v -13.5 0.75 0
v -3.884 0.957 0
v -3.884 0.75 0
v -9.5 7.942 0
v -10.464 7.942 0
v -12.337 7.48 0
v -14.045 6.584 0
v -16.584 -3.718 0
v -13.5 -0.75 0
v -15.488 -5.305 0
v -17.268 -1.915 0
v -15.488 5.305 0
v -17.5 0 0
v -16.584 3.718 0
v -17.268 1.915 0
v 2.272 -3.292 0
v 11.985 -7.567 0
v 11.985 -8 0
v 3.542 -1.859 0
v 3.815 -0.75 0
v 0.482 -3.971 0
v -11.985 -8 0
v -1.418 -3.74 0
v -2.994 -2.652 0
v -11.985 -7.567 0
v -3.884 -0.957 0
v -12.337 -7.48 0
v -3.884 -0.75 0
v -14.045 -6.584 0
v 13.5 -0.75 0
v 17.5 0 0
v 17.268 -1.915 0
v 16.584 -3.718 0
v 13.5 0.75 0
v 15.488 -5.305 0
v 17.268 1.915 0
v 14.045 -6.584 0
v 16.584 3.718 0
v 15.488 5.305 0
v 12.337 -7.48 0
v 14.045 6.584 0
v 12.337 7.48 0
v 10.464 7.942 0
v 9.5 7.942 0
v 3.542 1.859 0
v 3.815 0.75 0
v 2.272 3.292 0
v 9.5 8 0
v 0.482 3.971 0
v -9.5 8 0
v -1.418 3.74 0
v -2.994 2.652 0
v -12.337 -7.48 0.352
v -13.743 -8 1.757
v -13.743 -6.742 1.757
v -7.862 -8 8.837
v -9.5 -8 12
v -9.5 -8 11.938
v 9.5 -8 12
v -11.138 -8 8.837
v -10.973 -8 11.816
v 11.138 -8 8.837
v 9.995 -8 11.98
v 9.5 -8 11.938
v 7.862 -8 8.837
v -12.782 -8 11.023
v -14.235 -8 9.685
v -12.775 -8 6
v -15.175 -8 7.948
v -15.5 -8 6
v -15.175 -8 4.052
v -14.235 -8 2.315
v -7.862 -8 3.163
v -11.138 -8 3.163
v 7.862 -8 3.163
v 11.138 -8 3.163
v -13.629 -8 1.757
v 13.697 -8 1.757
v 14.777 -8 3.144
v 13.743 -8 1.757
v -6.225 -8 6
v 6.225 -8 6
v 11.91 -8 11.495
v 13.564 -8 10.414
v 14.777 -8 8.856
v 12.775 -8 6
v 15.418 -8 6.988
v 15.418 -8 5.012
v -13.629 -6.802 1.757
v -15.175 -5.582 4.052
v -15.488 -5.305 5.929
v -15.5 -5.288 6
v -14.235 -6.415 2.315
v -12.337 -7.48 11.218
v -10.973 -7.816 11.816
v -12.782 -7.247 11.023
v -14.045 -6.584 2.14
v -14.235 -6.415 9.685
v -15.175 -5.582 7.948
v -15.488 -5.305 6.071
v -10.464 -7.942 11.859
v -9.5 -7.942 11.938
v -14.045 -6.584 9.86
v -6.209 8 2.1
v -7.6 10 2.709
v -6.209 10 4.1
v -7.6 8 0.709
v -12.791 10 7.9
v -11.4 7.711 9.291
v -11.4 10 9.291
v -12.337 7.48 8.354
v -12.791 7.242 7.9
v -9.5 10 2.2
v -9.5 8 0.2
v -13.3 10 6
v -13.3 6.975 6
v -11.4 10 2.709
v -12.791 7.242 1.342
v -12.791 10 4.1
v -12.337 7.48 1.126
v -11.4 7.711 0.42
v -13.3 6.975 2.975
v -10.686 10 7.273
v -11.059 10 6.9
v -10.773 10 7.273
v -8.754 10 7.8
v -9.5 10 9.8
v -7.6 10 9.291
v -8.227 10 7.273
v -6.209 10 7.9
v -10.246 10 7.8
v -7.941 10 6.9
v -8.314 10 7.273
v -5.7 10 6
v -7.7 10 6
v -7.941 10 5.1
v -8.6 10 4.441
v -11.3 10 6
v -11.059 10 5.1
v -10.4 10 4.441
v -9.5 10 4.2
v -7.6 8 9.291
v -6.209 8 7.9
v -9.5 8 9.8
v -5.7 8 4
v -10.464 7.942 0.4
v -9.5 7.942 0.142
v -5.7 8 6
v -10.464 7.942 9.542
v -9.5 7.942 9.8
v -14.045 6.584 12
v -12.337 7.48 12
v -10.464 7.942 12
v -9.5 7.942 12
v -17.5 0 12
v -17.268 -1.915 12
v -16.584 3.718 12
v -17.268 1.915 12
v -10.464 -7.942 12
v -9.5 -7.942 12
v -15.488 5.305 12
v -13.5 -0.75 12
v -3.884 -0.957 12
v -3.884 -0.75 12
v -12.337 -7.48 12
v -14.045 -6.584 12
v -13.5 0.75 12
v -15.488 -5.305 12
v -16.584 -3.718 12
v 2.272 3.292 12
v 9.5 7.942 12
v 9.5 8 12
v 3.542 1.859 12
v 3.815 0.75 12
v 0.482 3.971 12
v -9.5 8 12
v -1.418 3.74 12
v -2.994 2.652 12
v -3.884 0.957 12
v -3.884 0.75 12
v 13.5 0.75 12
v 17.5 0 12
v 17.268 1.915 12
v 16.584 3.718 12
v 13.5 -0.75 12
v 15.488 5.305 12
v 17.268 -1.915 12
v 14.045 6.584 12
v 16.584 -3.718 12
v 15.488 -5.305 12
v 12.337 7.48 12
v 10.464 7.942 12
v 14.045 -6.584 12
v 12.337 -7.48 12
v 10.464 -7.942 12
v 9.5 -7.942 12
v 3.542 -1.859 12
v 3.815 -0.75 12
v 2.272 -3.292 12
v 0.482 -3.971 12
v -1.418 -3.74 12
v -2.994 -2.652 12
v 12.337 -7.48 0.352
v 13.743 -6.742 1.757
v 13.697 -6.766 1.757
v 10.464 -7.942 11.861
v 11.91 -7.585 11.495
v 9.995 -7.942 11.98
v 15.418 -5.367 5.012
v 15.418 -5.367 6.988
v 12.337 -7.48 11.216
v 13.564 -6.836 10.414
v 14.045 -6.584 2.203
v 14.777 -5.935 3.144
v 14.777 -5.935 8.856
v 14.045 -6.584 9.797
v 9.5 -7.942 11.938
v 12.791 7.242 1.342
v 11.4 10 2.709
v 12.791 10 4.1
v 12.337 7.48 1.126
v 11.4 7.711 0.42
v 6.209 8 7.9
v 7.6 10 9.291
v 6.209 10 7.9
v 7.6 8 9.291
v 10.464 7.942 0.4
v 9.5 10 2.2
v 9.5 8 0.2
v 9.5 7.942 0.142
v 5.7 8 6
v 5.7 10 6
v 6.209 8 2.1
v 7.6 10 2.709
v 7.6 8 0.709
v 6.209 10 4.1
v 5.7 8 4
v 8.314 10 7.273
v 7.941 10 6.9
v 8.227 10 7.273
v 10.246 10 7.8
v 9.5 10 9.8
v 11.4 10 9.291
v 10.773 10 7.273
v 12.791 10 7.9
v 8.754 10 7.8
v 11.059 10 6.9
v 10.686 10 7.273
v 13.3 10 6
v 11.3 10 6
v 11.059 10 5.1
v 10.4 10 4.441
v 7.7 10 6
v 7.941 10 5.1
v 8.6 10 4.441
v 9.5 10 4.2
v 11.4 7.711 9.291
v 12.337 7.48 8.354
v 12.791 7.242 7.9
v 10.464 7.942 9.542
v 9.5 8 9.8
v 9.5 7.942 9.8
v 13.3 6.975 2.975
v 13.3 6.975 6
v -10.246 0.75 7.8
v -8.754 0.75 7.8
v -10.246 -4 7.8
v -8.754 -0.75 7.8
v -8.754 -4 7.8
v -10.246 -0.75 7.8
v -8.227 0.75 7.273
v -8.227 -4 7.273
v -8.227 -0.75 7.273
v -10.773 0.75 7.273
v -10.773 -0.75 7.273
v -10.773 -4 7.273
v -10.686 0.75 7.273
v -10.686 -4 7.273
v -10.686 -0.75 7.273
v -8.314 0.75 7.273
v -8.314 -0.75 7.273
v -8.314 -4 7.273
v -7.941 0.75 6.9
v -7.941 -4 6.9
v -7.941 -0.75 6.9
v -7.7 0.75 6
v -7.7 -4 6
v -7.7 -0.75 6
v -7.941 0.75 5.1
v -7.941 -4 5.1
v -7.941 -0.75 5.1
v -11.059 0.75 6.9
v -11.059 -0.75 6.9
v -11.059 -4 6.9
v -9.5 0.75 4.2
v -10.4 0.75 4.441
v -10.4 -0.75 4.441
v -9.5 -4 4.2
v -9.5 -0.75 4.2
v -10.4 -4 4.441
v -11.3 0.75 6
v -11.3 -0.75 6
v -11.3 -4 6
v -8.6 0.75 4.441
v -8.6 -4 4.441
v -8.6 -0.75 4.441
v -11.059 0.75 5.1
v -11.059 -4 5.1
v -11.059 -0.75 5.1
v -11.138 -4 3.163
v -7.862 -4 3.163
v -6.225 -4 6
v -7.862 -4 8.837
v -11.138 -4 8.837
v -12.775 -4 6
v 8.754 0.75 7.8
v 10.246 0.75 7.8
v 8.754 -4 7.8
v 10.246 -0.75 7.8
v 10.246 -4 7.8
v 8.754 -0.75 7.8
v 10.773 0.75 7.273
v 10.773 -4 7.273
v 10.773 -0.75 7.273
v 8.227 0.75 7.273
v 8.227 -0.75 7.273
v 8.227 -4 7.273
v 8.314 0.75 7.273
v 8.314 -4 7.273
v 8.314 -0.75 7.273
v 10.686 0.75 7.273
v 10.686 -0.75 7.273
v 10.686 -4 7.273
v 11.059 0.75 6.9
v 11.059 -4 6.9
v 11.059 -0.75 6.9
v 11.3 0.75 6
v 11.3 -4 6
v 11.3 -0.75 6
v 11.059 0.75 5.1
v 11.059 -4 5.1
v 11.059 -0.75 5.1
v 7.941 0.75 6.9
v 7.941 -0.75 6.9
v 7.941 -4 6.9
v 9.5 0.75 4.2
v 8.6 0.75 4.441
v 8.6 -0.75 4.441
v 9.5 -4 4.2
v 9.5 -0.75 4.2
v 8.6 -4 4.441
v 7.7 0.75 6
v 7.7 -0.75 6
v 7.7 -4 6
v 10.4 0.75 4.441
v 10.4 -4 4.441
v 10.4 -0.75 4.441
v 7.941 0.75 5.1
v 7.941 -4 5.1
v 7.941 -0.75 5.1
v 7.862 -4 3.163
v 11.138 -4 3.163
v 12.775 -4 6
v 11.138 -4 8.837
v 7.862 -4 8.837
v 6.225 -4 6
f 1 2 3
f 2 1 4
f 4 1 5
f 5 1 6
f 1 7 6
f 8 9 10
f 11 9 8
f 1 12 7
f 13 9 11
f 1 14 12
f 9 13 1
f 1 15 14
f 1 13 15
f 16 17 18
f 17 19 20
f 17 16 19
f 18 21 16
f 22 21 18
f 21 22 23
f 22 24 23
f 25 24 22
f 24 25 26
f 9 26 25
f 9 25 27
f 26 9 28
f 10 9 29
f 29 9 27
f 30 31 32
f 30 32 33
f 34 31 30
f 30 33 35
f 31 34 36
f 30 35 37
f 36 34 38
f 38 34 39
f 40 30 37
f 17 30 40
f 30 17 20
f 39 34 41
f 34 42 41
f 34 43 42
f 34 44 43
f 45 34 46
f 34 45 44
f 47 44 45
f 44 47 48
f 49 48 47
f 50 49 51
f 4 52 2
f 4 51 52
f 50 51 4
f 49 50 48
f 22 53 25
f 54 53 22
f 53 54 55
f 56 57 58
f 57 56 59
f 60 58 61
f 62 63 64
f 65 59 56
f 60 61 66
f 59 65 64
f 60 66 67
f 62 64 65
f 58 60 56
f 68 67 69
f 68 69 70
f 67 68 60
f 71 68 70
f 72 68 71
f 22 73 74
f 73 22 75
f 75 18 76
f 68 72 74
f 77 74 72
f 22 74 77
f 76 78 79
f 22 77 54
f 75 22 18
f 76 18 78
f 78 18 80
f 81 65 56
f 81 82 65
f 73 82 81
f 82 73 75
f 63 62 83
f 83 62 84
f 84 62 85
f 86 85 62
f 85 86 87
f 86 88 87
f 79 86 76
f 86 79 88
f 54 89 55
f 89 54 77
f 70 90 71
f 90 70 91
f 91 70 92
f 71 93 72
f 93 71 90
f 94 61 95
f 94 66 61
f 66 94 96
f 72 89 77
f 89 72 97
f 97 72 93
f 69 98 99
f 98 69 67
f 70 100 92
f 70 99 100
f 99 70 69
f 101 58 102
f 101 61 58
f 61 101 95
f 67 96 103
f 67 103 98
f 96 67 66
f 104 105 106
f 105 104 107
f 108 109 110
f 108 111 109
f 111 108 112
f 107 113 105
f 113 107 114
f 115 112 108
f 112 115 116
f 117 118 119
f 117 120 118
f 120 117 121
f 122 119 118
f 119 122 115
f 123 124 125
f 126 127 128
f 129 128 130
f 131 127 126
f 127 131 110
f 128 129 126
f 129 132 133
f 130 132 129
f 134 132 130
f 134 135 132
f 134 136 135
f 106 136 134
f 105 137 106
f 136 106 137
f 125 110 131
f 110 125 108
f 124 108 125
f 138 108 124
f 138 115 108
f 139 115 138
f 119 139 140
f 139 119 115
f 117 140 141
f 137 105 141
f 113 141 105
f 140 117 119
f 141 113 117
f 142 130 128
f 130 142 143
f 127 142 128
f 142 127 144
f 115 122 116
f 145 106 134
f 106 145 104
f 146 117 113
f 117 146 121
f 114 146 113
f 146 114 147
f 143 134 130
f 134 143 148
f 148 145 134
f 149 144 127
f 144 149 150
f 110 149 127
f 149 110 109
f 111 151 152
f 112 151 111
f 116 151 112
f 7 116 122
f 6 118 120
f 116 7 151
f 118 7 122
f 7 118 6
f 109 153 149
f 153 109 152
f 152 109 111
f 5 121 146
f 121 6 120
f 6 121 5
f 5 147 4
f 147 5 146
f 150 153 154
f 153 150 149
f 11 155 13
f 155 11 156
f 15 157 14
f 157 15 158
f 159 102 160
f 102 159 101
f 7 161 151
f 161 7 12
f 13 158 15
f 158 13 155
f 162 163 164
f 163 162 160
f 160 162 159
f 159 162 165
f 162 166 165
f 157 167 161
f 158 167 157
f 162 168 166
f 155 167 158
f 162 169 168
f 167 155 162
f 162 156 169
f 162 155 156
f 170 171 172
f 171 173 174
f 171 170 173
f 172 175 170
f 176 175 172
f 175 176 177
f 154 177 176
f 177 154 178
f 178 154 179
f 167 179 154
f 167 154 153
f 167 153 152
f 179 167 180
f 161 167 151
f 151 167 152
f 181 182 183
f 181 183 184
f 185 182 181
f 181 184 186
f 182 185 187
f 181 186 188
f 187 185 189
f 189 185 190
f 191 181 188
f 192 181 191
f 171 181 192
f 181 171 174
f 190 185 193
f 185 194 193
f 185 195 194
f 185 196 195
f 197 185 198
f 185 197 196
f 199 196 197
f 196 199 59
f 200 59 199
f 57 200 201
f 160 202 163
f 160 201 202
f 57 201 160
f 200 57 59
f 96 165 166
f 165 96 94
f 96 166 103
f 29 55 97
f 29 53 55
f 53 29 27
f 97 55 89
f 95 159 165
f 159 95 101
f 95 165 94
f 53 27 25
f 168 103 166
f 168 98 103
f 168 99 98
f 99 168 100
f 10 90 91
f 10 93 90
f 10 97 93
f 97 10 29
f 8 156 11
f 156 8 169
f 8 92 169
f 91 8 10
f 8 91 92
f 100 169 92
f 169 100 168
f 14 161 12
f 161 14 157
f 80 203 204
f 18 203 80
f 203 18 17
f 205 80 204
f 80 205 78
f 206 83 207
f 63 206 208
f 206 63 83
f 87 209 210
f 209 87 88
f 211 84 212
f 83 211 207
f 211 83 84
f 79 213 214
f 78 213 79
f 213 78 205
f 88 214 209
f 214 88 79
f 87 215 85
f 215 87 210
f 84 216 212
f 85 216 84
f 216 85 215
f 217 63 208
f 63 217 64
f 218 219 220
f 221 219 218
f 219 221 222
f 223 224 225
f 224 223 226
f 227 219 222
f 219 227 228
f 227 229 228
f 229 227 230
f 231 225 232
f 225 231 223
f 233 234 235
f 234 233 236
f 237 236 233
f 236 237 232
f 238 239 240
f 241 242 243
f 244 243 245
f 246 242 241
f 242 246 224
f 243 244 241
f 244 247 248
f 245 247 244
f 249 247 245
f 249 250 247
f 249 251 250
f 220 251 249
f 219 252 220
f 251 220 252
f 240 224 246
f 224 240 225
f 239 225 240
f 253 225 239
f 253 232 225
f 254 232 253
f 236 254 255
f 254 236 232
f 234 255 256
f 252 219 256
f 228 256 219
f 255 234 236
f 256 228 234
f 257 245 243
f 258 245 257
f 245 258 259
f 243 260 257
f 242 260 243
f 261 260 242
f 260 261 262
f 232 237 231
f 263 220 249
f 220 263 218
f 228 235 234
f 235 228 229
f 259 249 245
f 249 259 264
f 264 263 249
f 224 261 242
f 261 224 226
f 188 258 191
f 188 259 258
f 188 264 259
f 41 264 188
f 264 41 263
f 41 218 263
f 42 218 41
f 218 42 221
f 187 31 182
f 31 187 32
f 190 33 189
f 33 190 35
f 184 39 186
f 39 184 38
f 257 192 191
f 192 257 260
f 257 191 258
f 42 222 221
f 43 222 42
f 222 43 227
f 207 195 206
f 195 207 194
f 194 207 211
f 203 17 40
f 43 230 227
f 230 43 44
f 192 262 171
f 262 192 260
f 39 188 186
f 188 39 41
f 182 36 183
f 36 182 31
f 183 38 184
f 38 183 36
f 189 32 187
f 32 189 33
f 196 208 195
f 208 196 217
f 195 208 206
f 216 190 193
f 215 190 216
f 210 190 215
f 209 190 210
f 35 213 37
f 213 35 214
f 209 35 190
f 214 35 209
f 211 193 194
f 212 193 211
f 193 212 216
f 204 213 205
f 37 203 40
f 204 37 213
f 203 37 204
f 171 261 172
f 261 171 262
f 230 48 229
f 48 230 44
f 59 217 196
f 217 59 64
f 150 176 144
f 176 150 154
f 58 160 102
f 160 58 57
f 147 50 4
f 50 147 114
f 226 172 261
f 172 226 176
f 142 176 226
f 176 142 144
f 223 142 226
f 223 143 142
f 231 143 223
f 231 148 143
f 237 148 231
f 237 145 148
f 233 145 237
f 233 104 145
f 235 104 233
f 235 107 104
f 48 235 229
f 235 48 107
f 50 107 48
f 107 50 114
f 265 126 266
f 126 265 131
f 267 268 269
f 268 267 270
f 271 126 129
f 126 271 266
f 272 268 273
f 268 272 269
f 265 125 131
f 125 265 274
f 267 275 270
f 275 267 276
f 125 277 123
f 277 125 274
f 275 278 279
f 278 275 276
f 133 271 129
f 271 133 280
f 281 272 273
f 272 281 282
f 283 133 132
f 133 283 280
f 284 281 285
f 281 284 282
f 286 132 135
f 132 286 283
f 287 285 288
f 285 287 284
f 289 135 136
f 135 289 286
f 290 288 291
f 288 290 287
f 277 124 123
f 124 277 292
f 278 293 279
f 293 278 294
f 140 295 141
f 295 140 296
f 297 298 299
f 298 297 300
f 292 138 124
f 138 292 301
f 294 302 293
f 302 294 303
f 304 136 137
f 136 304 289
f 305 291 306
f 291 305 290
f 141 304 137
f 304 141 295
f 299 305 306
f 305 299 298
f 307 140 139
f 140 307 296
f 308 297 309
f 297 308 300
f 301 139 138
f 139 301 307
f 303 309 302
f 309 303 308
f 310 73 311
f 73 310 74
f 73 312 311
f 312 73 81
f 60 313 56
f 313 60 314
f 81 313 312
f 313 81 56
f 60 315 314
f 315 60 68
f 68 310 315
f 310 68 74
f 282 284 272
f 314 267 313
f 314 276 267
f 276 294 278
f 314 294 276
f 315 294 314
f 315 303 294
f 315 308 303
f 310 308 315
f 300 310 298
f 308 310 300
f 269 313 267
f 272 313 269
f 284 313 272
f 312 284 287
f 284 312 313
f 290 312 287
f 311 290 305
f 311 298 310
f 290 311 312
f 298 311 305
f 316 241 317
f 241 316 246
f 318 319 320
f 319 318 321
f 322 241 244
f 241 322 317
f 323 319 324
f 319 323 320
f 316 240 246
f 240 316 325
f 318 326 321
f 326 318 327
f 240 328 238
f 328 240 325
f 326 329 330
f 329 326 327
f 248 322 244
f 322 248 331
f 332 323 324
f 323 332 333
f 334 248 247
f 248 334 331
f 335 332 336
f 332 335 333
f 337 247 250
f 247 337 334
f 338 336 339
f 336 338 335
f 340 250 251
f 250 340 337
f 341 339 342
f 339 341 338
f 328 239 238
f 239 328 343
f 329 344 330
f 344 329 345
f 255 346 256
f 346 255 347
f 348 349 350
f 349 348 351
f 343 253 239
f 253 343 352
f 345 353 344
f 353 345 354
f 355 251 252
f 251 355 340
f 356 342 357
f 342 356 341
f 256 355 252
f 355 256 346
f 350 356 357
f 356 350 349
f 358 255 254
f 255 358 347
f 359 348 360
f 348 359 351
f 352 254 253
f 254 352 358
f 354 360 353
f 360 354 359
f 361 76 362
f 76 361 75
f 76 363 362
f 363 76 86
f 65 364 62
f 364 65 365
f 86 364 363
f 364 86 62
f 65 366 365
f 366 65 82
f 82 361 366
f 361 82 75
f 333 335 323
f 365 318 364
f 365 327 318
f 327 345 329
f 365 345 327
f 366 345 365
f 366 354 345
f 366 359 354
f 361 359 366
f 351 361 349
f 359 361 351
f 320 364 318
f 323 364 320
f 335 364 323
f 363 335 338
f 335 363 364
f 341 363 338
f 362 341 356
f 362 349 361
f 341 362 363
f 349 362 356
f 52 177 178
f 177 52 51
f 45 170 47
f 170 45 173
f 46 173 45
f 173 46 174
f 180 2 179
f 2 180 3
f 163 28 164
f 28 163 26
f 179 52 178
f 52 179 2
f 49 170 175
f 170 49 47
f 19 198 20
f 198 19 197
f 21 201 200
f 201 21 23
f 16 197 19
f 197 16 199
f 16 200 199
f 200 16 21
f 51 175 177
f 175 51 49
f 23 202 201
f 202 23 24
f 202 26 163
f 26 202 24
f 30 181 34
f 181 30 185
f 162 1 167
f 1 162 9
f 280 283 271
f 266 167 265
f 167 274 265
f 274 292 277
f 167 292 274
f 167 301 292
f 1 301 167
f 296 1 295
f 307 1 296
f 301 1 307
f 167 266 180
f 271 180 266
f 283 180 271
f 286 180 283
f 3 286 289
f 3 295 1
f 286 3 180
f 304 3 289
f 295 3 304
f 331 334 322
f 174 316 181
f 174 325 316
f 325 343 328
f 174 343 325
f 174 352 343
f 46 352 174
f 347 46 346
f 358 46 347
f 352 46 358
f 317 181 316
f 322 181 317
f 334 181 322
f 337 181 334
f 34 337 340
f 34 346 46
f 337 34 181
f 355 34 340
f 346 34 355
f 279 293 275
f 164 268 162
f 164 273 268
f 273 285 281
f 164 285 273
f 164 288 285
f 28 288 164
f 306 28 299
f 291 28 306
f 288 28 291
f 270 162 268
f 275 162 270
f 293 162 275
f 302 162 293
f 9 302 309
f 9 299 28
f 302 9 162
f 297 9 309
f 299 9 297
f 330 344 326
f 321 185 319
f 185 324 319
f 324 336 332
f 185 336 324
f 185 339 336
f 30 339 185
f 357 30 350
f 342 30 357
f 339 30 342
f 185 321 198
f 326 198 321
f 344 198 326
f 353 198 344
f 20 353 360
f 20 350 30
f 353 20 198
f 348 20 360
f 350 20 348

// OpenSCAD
// file: configuration.scad
//
//	configuration.scad
//
//	General configuration settings.
//
//	Because this file is intended to be somewhat interchangable with 
//		configuration.scad from prusajr's github repository, there is 
//		more configuration in "moreConfiguration.scad".
//
// Edit variant to match the types of nuts and bolts you want to use in your part.
//
//	Edit layer_height to be greater than the height of one printed layer, 
//		but less than the height of two printed layers.
//


metric = 0;	// All parts are metric - use both M3 and M4 bolts.
sae = 1;		// All parts are SAE - use only #6/32 bolts.
m3only = 2;	// All parts are metric, but use only M3 bolts.
hybrid = 3;	// Mix of metric and SAE - use M3 and 6/32 bolts.

variant = metric;

layer_height = .25;

nut_slop = .2;		// I aim for a "interference fit" for nuts - a bit of force required to place the nut.

bolt_slop = .6;	// The aim here is to just barely allow the bolt to fit through the hole, without having to thread it in.

_actual_m3_diameter = 3+bolt_slop;
_actual_m4_diameter = 4+bolt_slop;
_actual_6_32_diameter = 3.4+bolt_slop;

_actual_m3_nut_diameter = 5.5/cos(30)+nut_slop;
_actual_m4_nut_diameter = 6.87/cos(30)+nut_slop;
_actual_m5_nut_diameter = 7.85/cos(30)+nut_slop;
_actual_6_32_nut_diameter = 7.85/cos(30)+nut_slop;

_m3_diameters = [_actual_m3_diameter, _actual_6_32_diameter, _actual_m3_diameter, _actual_m3_diameter];
_m3_nut_diameters = [_actual_m3_nut_diameter, _actual_6_32_nut_diameter, _actual_m3_nut_diameter, _actual_m3_nut_diameter];

_m4_diameters = [_actual_m4_diameter, _actual_6_32_diameter, _actual_m3_diameter, _actual_6_32_diameter];
_m4_nut_diameters = [_actual_m4_nut_diameter, _actual_6_32_nut_diameter, _actual_m3_nut_diameter, _actual_6_32_nut_diameter];

m3_diameter = _m3_diameters[variant];
m3_nut_diameter = _m3_nut_diameters[variant];

m4_diameter = _m4_diameters[variant];
m4_nut_diameter = _m4_nut_diameters[variant];

m5_diameter = 5+bolt_slop;
m5_nut_diameter = 7.85/cos(30)+nut_slop;
m5_bolt_head_height = 4;

m6_diameter = 6+bolt_slop;
m6_nut_diameter = 10/cos(30)+nut_slop;
m6_bolt_head_height = 4;

m8_diameter = 8;

m8_nut_diameter = 12.8/cos(30)+nut_slop;
m8_nut_thickness = 7.7;
m8_bolt_head_height = 6;
m8_half_nut_height = 3.85;

threaded_rod_diameter = 8.7;
smooth_rod_diameter = 8.25;
// file: vitamin.scad
//
// RepRap Mendel Akimbo
//
// A Mendel variant, which improves the frame's clearance and stability
//  by increasing its triangulation.
//
// Copyright 2012 by Ron Aldrich.
//
// Licensed under GNU GPL v2
//
// vitamin.scad
//
// A method for creating a list of vitamins from within a part's scad file.

M3x12 = "M3x12 Bolt";
M3x16 = "M3x16 Bolt";
M3x20 = "M3x20 Bolt";
M3x25 = "M3x25 Bolt";
M3x30 = "M3x30 Bolt";

M3_nut = "M3 nut";
M3_nylock = "M3 nylock nut";

M3_washer = "M3 washer";

M5_nut = "M5 nut";

M8x30 = "M8x30 Bolt";
M8_nut = "M8 nut";
M8_washer = "M8 Washer";

nema_17 = "Nema 17 Stepper Motor";

optional = "Optional";

module vitamin(part, part_count, count, name, substitute=false, comment=false)
{
  theSubstitue = (substitute==false) ? name : substitute;
  theComment = (comment == false) ? "" : comment;
  
  echo(str("Vitamin - ", part, "_@_", part_count, ", ", count, ", ", name, ", ", theSubstitue, ", ", theComment));
}
// file: optical_endstop.scad
X=0;
Y=1;
Z=2;

function endstop_bolt_spacing() = 19;
bolt_spacing = endstop_bolt_spacing();


circuit_size = [16, 30, 1.5];
endstop_size = [6, 24, 13];
endstop_void_size = [6, 3.5, 7.5];

circuit_center = [(circuit_size[X]-endstop_size[X])/2, -(circuit_size[Y]-endstop_size[Y])/2, circuit_size[Z]/2];
endstop_center = [0, 0, endstop_size[Z]/2];
endstop_void_center = [0, 0, endstop_size[Z]-endstop_void_size[Z]/2];

module optical_endstop_solid()
{
	translate(circuit_center)
	cube(circuit_size, center=true);

	translate(endstop_center+[0, 0, -.05])
	cube(endstop_size+[0, 0, .1], center=true);
}

module optical_endstop_void()
{
	translate(endstop_void_center+[0, 0, .05])
	cube(endstop_void_size+[.1, 0, .1], center=true);
}

module optical_endstop()
{
	difference()
	{
		optical_endstop_solid();
		optical_endstop_void();
	}
}

optical_endstop();
// file: functions.scad
x=0;
y=1;
z=2;

function average(va, vb) = [
	(va[x]+vb[x])/2,
	(va[y]+vb[y])/2,
	(va[z]+vb[z])/2];

function centerof(a, b) = [(a[x]+b[x])/2, (a[y]+b[y])/2, (a[z]+b[z])/2];
function sizeof(a, b) = [b[x]-a[x], b[y]-a[y], b[z]-a[z]];
function minof(a, b) = [a[x]-b[x]/2, a[y]-b[y]/2, a[z]-b[z]/2];
function maxof(a, b) = [a[x]+b[x]/2, a[y]+b[y]/2, a[z]+b[z]/2];

function pitch_radius(number_of_teeth, modulus=1) = number_of_teeth * modulus / 2;

function rotate_vec(v,a)=[cos(a)*v[0]-sin(a)*v[1],sin(a)*v[0]+cos(a)*v[1]];

function matrix_multiply(a, b) = [
	[a[0][0]*b[0][0]+a[0][1]*b[1][0]+a[0][2]*b[2][0], a[0][0]*b[0][1]+a[0][1]*b[1][1]+a[0][2]*b[2][1], a[0][0]*b[0][2]+a[0][1]*b[1][2]+a[0][2]*b[2][2]],
	[a[1][0]*b[0][0]+a[1][1]*b[1][0]+a[1][2]*b[2][0], a[1][0]*b[0][1]+a[1][1]*b[1][1]+a[1][2]*b[2][1], a[1][0]*b[0][2]+a[1][1]*b[1][2]+a[1][2]*b[2][2]],
	[a[2][0]*b[0][0]+a[2][1]*b[1][0]+a[2][2]*b[2][0], a[2][0]*b[0][1]+a[2][1]*b[1][1]+a[2][2]*b[2][1], a[2][0]*b[0][2]+a[2][1]*b[1][2]+a[2][2]*b[2][2]]
];

function matrix_rotate_x(t) = [ [1, 0, 0], [0, cos(t), -sin(t)], [0, sin(t), cos(t)] ];
function matrix_rotate_y(t) = [ [cos(t), 0, sin(t)], [0, 1, 0], [-sin(t), 0, cos(t)] ];
function matrix_rotate_z(t) = [ [cos(t), -sin(t), 0], [sin(t), cos(t), 0], [0, 0, 1] ];

function matrix_rotate(a) = matrix_multiply( matrix_multiply(matrix_rotate_x(a[x]), matrix_rotate_y(a[y])), matrix_rotate_z(a[z]) );


function vector_rotate(v, a) = matrix_multiply([v, [0, 0, 0], [0, 0, 0]], matrix_rotate(a))[0];
// file: teardrops.scad
//
// RepRap Mendel Akimbo
//
// A Mendel variant, which improves the frame's clearance and stability
//  by increasing it's triangulation.
//
// Copyright 2012 by Ron Aldrich.
//
// Licensed under GNU GPL v2
//
// teardrops.scad
//
// Generates 2d and 3d teardrop profiles.
//

module hexircle(r, $fn)
{
	intersection()
	{
		circle(r=r/cos(30), $fn=6);
		translate([0, r*3/4])
		square([r*2, r/2], center=true);
	}

	rotate([0, 0, 180/$fn])
	circle(r=r, $fn=$fn);
}

module teardrop(h, r, center=false, $fn)
{
	render(convexity=1)
	cylinder(h=h, r=r, center=center, $fn=$fn);
	translate([0, r/2*sqrt(2), 0])
	cylinder(h=h, r=r*cos(45), center=center, $fn=4);
}

octircle(h=1, r=10, $fn=40, center=true);

module hexylinder(h, r, center=false, $fn)
{
	render(convexity=1)
	intersection()
	{
		rotate([0, 0, 0])
		cylinder(h=h, r=r/cos(30), center=center, $fn=6);
		if (center)
		{
			translate([0, r*3/4, 0])
			cube([r*2, r/2, h+.1], center=true);
		}
		else
		{
			translate([0, r*3/4, h/2])
			cube([r*2, r/2, h+.1], center=true);
		}
	}
	rotate([0, 0, 180/$fn])
	cylinder(h=h, r=r, $fn=$fn, center=center);
}

module hexasphere(r, $fn)
{
	render(convexity=1)
	{
		intersection()
		{
			cylinder(h=r, r1=r/cos(30), r2=r/cos(30)/2, $fn=$fn);
			translate([0, 0, r*3/4])
			cube([r*2, r*2, r/2], center=true);
		}
		sphere(r, $fn);
	}
}

module octircle(r, $fn)
{
	a=r/(1+sqrt(2));
	b=(r-a)/2;

	intersection()
	{
		rotate(45/2)
		circle(r=r/cos(45/2), $fn=8);
		translate([0, r-b/2])
		square([r*2, b], center=true);
	}

	rotate(180/$fn)
	circle(r=r, $fn=$fn);
}

module octylinder(h, r, center=false, $fn)
{
	a=r/(1+sqrt(2));
	b=(r-a)/2;

	render(convexity=1)
	intersection()
	{
		rotate([0, 0, 45/2])
		cylinder(h=h, r=r/cos(45/2), center=center, $fn=8);
		if (center)
		{
			translate([0, r-b/2, 0])
			cube([r*2, b, h+.1], center=true);
		}
		else
		{
			translate([0, r-b/2, h/2])
			cube([r*2, b, h+.1], center=true);
		}
	}
	//rotate([0, 0, 180/$fn])
	cylinder(h=h, r=r, $fn=$fn, center=center);
}

module octasphere(r, $fn)
{
	a=r/(1+sqrt(2));
	b=(r-a)/2;

	render(convexity=1)
	intersection()
	{
		translate([0, 0, a])
		cylinder(h=r-a, r1=r, r2=a, $fn=$fn);
		translate([0, 0, r-b/2])
		cube([r*2, r*2, b], center=true);
	}
	sphere(r, $fn=$fn);
}
// file: more_configuration.scad
//
// moreConfiguration.scad
//
//	General configuration settings that didn't exist in prusajr's configuration.scad
//
//	These settings are here, rather than in configuration.scad, in
//		order to keep configuration.scad interchangable with prusajr.s version.
//
// Edit extrusion_width to be greater than the width of one shell, but less than the width of two shells.

include <configuration.scad>

extrusion_width = .6;

vertical_slop = .6;
horizontal_slop = .3;

_actual_m3_nut_thickness = 2.5;
_actual_m4_nut_thickness = 3.5;
_actual_6_32_nut_thickness = 3.25;

_m3_nut_thickness = [_actual_m3_nut_thickness, _actual_6_32_nut_thickness, _actual_m3_nut_thickness, _actual_m3_nut_thickness];

_m4_nut_thickness = [_actual_m4_nut_thickness, _actual_6_32_nut_thickness, _actual_m3_nut_thickness, _actual_6_32_nut_thickness];

m3_nut_thickness = _m3_nut_thickness[variant];
m3_washer_diameter = 7.5;

m4_nut_thickness = _m4_nut_thickness[variant];

m3_bolt_head_height = 3;
m3_bolt_head_diameter = 6+horizontal_slop;

m4_bolt_head_height = 4;
m4_bolt_head_diameter = 7+horizontal_slop;

// Don't edit things after here.

x = 0;
y = 1;
z = 2;

bearing_length = 0;
bearing_body_diameter = 1;
bearing_flange_diameter = 2;
bearing_flange_width = 3;
bearing_rod_diameter = 4;

624_bearing = [5, 13, 13, 0, 4];
624_bearing_clearance = [0.4, 0.4, 0.4, 0, 2];

608_bearing = [7, 22, 22, 0, 8];
608_bearing_clearance = [0.4, 0.4, 0.4, 0, 2];

115_bearing = [4, 11, 11, 0, 5];
115_bearing_clearance = [0.4, 0.4, 0.4, 0, 3];

106_bearing = [3, 10, 10, 0, 6];
106_bearing_clearance = [0.4, 0.4, 0.4, 0, 0];

126_bearing = [4, 12, 12, 0, 6];
126_bearing_clearance = [0.4, 0.4, 0.4, 0, 3];

128_bearing = [3.5, 12, 12, 0, 8];
128_bearing_clearance = [0.4, 0.4, 0.4, 4];

lm8uu = [24, 15, 15, 0, 8];
lm8uu_clearance = [0.7, 0.7, 0.7, 0, 0];

igus = [10, 10, 15, 1, 8];
igus_clearance = [0.4, 0.4, 0.4, 0.4, 0];

part_color_1 = [1, .9, 0];
part_color_2 = [.9, 1, 0];

wood_color_1 = [111/256, 78/256, 55/256];
wood_color_2 = wood_color_1+[.2, .2, .2];
wood_color_3 = wood_color_1-[.2, .2, .2];

nema17_hole_spacing = 1.25*25.4;

ramps_size = [102, 60];

ramps_mounts = [[-35.76, -20.86],
                [-35.76, 27.4],
                [39.17, 27.4],
                [45.52, -20.86]];

//echo(ramps_mounts);
// main file
include <more_configuration.scad>

use <teardrops.scad>
use <functions.scad>
use <optical_endstop.scad>

include <vitamin.scad>

part_name = "akimbo_endstop_mount";
part_count = 2;

print_orientation = false;

smooth_rod_clamp_radius = 4;

endstop_bolt_spacing = 19;
endstop_button_height = 2;
endstop_button_radius = m3_diameter/2+2;

clamp_body_radius = 8;
clamp_body_size = [endstop_bolt_spacing, clamp_body_radius*2, 12];
clamp_body_center = [0, 0, clamp_body_size[z]/2];

akimbo_endstop_mount(print_orientation = print_orientation);

%akimbo_endstop_annotations(print_orientation = print_orientation);

module akimbo_endstop_mount(print_orientation)
{
	p1 = (print_orientation == true) ? 1 : 0;
	p2 = (print_orientation == false) ? 1 : 0;

	difference()
	{
		akimbo_endstop_mount_solid();
		akimbo_endstop_mount_void();
	}
}

module akimbo_endstop_mount_solid()
{
	translate(clamp_body_center)
	cube(clamp_body_size, center=true);

	for(i=[-1, 1])
		translate(clamp_body_center+[i*endstop_bolt_spacing/2, 0, 0])
		{
			cylinder(h=clamp_body_size[z], r=clamp_body_radius, center=true);

			translate([0, -(clamp_body_size[y]/2-2), 0])
			rotate([90, 0, 0])
			rotate([0, 0, 180])
			octylinder(h=4, r=clamp_body_size[z]/2, center=true);

			intersection()
			{
				hull()
				{
					translate([0, (clamp_body_size[y])/2, 0])
					rotate([90, 0, 0])
					cylinder(h=endstop_button_height*2, r=endstop_button_radius, center=true);

					rotate([-90, 0, 0])
					translate([0, (clamp_body_size[y])/2, 0])
					rotate([90, 0, 0])
					cylinder(h=endstop_button_height*2, r=endstop_button_radius, center=true);
				}

				cube([endstop_button_radius*2+.1, clamp_body_size[y]+endstop_button_height*2+.1, clamp_body_size[z]], center=true);
			}
		}
}

module akimbo_endstop_mount_void()
{
	translate(clamp_body_center)
	{
		cylinder(h=clamp_body_size[z]+.1, r=smooth_rod_clamp_radius, center=true);

		cube([clamp_body_size[x]+clamp_body_radius, 1.5, clamp_body_size[z]+.1], center=true);

		for(i=[-1, 1])
			translate([i*endstop_bolt_spacing/2, 0, 0])
			rotate([90, 0, 0])
			{
				octylinder(h=clamp_body_size[y]+endstop_button_height*2+.1, r=m3_diameter/2, $fn=12, center=true);
				translate([0, 0, 4])
				cylinder(h=10, r=m3_nut_diameter/2, $fn=6, center=false);
			}
	}
  
  vitamin(part_name, part_count, 1, "End Stop", comment="Optical, or Cheap-O - 19mm hole spacing");
  vitamin(part_name, part_count, 1, M3x20);
  vitamin(part_name, part_count, 1, M3_washer);
  vitamin(part_name, part_count, 1, M3_nylock, M3_nut);
}

module akimbo_endstop_annotations(print_orientation)
{
	if (print_orientation == false)
	{
		translate([0, clamp_body_center[y]+clamp_body_size[y]/2+endstop_button_height+.05, clamp_body_center[z]])
		rotate([90, 0, 0])
		rotate([0, 0, 90])
		rotate([0, 180, 0])
		optical_endstop();
	}
}
